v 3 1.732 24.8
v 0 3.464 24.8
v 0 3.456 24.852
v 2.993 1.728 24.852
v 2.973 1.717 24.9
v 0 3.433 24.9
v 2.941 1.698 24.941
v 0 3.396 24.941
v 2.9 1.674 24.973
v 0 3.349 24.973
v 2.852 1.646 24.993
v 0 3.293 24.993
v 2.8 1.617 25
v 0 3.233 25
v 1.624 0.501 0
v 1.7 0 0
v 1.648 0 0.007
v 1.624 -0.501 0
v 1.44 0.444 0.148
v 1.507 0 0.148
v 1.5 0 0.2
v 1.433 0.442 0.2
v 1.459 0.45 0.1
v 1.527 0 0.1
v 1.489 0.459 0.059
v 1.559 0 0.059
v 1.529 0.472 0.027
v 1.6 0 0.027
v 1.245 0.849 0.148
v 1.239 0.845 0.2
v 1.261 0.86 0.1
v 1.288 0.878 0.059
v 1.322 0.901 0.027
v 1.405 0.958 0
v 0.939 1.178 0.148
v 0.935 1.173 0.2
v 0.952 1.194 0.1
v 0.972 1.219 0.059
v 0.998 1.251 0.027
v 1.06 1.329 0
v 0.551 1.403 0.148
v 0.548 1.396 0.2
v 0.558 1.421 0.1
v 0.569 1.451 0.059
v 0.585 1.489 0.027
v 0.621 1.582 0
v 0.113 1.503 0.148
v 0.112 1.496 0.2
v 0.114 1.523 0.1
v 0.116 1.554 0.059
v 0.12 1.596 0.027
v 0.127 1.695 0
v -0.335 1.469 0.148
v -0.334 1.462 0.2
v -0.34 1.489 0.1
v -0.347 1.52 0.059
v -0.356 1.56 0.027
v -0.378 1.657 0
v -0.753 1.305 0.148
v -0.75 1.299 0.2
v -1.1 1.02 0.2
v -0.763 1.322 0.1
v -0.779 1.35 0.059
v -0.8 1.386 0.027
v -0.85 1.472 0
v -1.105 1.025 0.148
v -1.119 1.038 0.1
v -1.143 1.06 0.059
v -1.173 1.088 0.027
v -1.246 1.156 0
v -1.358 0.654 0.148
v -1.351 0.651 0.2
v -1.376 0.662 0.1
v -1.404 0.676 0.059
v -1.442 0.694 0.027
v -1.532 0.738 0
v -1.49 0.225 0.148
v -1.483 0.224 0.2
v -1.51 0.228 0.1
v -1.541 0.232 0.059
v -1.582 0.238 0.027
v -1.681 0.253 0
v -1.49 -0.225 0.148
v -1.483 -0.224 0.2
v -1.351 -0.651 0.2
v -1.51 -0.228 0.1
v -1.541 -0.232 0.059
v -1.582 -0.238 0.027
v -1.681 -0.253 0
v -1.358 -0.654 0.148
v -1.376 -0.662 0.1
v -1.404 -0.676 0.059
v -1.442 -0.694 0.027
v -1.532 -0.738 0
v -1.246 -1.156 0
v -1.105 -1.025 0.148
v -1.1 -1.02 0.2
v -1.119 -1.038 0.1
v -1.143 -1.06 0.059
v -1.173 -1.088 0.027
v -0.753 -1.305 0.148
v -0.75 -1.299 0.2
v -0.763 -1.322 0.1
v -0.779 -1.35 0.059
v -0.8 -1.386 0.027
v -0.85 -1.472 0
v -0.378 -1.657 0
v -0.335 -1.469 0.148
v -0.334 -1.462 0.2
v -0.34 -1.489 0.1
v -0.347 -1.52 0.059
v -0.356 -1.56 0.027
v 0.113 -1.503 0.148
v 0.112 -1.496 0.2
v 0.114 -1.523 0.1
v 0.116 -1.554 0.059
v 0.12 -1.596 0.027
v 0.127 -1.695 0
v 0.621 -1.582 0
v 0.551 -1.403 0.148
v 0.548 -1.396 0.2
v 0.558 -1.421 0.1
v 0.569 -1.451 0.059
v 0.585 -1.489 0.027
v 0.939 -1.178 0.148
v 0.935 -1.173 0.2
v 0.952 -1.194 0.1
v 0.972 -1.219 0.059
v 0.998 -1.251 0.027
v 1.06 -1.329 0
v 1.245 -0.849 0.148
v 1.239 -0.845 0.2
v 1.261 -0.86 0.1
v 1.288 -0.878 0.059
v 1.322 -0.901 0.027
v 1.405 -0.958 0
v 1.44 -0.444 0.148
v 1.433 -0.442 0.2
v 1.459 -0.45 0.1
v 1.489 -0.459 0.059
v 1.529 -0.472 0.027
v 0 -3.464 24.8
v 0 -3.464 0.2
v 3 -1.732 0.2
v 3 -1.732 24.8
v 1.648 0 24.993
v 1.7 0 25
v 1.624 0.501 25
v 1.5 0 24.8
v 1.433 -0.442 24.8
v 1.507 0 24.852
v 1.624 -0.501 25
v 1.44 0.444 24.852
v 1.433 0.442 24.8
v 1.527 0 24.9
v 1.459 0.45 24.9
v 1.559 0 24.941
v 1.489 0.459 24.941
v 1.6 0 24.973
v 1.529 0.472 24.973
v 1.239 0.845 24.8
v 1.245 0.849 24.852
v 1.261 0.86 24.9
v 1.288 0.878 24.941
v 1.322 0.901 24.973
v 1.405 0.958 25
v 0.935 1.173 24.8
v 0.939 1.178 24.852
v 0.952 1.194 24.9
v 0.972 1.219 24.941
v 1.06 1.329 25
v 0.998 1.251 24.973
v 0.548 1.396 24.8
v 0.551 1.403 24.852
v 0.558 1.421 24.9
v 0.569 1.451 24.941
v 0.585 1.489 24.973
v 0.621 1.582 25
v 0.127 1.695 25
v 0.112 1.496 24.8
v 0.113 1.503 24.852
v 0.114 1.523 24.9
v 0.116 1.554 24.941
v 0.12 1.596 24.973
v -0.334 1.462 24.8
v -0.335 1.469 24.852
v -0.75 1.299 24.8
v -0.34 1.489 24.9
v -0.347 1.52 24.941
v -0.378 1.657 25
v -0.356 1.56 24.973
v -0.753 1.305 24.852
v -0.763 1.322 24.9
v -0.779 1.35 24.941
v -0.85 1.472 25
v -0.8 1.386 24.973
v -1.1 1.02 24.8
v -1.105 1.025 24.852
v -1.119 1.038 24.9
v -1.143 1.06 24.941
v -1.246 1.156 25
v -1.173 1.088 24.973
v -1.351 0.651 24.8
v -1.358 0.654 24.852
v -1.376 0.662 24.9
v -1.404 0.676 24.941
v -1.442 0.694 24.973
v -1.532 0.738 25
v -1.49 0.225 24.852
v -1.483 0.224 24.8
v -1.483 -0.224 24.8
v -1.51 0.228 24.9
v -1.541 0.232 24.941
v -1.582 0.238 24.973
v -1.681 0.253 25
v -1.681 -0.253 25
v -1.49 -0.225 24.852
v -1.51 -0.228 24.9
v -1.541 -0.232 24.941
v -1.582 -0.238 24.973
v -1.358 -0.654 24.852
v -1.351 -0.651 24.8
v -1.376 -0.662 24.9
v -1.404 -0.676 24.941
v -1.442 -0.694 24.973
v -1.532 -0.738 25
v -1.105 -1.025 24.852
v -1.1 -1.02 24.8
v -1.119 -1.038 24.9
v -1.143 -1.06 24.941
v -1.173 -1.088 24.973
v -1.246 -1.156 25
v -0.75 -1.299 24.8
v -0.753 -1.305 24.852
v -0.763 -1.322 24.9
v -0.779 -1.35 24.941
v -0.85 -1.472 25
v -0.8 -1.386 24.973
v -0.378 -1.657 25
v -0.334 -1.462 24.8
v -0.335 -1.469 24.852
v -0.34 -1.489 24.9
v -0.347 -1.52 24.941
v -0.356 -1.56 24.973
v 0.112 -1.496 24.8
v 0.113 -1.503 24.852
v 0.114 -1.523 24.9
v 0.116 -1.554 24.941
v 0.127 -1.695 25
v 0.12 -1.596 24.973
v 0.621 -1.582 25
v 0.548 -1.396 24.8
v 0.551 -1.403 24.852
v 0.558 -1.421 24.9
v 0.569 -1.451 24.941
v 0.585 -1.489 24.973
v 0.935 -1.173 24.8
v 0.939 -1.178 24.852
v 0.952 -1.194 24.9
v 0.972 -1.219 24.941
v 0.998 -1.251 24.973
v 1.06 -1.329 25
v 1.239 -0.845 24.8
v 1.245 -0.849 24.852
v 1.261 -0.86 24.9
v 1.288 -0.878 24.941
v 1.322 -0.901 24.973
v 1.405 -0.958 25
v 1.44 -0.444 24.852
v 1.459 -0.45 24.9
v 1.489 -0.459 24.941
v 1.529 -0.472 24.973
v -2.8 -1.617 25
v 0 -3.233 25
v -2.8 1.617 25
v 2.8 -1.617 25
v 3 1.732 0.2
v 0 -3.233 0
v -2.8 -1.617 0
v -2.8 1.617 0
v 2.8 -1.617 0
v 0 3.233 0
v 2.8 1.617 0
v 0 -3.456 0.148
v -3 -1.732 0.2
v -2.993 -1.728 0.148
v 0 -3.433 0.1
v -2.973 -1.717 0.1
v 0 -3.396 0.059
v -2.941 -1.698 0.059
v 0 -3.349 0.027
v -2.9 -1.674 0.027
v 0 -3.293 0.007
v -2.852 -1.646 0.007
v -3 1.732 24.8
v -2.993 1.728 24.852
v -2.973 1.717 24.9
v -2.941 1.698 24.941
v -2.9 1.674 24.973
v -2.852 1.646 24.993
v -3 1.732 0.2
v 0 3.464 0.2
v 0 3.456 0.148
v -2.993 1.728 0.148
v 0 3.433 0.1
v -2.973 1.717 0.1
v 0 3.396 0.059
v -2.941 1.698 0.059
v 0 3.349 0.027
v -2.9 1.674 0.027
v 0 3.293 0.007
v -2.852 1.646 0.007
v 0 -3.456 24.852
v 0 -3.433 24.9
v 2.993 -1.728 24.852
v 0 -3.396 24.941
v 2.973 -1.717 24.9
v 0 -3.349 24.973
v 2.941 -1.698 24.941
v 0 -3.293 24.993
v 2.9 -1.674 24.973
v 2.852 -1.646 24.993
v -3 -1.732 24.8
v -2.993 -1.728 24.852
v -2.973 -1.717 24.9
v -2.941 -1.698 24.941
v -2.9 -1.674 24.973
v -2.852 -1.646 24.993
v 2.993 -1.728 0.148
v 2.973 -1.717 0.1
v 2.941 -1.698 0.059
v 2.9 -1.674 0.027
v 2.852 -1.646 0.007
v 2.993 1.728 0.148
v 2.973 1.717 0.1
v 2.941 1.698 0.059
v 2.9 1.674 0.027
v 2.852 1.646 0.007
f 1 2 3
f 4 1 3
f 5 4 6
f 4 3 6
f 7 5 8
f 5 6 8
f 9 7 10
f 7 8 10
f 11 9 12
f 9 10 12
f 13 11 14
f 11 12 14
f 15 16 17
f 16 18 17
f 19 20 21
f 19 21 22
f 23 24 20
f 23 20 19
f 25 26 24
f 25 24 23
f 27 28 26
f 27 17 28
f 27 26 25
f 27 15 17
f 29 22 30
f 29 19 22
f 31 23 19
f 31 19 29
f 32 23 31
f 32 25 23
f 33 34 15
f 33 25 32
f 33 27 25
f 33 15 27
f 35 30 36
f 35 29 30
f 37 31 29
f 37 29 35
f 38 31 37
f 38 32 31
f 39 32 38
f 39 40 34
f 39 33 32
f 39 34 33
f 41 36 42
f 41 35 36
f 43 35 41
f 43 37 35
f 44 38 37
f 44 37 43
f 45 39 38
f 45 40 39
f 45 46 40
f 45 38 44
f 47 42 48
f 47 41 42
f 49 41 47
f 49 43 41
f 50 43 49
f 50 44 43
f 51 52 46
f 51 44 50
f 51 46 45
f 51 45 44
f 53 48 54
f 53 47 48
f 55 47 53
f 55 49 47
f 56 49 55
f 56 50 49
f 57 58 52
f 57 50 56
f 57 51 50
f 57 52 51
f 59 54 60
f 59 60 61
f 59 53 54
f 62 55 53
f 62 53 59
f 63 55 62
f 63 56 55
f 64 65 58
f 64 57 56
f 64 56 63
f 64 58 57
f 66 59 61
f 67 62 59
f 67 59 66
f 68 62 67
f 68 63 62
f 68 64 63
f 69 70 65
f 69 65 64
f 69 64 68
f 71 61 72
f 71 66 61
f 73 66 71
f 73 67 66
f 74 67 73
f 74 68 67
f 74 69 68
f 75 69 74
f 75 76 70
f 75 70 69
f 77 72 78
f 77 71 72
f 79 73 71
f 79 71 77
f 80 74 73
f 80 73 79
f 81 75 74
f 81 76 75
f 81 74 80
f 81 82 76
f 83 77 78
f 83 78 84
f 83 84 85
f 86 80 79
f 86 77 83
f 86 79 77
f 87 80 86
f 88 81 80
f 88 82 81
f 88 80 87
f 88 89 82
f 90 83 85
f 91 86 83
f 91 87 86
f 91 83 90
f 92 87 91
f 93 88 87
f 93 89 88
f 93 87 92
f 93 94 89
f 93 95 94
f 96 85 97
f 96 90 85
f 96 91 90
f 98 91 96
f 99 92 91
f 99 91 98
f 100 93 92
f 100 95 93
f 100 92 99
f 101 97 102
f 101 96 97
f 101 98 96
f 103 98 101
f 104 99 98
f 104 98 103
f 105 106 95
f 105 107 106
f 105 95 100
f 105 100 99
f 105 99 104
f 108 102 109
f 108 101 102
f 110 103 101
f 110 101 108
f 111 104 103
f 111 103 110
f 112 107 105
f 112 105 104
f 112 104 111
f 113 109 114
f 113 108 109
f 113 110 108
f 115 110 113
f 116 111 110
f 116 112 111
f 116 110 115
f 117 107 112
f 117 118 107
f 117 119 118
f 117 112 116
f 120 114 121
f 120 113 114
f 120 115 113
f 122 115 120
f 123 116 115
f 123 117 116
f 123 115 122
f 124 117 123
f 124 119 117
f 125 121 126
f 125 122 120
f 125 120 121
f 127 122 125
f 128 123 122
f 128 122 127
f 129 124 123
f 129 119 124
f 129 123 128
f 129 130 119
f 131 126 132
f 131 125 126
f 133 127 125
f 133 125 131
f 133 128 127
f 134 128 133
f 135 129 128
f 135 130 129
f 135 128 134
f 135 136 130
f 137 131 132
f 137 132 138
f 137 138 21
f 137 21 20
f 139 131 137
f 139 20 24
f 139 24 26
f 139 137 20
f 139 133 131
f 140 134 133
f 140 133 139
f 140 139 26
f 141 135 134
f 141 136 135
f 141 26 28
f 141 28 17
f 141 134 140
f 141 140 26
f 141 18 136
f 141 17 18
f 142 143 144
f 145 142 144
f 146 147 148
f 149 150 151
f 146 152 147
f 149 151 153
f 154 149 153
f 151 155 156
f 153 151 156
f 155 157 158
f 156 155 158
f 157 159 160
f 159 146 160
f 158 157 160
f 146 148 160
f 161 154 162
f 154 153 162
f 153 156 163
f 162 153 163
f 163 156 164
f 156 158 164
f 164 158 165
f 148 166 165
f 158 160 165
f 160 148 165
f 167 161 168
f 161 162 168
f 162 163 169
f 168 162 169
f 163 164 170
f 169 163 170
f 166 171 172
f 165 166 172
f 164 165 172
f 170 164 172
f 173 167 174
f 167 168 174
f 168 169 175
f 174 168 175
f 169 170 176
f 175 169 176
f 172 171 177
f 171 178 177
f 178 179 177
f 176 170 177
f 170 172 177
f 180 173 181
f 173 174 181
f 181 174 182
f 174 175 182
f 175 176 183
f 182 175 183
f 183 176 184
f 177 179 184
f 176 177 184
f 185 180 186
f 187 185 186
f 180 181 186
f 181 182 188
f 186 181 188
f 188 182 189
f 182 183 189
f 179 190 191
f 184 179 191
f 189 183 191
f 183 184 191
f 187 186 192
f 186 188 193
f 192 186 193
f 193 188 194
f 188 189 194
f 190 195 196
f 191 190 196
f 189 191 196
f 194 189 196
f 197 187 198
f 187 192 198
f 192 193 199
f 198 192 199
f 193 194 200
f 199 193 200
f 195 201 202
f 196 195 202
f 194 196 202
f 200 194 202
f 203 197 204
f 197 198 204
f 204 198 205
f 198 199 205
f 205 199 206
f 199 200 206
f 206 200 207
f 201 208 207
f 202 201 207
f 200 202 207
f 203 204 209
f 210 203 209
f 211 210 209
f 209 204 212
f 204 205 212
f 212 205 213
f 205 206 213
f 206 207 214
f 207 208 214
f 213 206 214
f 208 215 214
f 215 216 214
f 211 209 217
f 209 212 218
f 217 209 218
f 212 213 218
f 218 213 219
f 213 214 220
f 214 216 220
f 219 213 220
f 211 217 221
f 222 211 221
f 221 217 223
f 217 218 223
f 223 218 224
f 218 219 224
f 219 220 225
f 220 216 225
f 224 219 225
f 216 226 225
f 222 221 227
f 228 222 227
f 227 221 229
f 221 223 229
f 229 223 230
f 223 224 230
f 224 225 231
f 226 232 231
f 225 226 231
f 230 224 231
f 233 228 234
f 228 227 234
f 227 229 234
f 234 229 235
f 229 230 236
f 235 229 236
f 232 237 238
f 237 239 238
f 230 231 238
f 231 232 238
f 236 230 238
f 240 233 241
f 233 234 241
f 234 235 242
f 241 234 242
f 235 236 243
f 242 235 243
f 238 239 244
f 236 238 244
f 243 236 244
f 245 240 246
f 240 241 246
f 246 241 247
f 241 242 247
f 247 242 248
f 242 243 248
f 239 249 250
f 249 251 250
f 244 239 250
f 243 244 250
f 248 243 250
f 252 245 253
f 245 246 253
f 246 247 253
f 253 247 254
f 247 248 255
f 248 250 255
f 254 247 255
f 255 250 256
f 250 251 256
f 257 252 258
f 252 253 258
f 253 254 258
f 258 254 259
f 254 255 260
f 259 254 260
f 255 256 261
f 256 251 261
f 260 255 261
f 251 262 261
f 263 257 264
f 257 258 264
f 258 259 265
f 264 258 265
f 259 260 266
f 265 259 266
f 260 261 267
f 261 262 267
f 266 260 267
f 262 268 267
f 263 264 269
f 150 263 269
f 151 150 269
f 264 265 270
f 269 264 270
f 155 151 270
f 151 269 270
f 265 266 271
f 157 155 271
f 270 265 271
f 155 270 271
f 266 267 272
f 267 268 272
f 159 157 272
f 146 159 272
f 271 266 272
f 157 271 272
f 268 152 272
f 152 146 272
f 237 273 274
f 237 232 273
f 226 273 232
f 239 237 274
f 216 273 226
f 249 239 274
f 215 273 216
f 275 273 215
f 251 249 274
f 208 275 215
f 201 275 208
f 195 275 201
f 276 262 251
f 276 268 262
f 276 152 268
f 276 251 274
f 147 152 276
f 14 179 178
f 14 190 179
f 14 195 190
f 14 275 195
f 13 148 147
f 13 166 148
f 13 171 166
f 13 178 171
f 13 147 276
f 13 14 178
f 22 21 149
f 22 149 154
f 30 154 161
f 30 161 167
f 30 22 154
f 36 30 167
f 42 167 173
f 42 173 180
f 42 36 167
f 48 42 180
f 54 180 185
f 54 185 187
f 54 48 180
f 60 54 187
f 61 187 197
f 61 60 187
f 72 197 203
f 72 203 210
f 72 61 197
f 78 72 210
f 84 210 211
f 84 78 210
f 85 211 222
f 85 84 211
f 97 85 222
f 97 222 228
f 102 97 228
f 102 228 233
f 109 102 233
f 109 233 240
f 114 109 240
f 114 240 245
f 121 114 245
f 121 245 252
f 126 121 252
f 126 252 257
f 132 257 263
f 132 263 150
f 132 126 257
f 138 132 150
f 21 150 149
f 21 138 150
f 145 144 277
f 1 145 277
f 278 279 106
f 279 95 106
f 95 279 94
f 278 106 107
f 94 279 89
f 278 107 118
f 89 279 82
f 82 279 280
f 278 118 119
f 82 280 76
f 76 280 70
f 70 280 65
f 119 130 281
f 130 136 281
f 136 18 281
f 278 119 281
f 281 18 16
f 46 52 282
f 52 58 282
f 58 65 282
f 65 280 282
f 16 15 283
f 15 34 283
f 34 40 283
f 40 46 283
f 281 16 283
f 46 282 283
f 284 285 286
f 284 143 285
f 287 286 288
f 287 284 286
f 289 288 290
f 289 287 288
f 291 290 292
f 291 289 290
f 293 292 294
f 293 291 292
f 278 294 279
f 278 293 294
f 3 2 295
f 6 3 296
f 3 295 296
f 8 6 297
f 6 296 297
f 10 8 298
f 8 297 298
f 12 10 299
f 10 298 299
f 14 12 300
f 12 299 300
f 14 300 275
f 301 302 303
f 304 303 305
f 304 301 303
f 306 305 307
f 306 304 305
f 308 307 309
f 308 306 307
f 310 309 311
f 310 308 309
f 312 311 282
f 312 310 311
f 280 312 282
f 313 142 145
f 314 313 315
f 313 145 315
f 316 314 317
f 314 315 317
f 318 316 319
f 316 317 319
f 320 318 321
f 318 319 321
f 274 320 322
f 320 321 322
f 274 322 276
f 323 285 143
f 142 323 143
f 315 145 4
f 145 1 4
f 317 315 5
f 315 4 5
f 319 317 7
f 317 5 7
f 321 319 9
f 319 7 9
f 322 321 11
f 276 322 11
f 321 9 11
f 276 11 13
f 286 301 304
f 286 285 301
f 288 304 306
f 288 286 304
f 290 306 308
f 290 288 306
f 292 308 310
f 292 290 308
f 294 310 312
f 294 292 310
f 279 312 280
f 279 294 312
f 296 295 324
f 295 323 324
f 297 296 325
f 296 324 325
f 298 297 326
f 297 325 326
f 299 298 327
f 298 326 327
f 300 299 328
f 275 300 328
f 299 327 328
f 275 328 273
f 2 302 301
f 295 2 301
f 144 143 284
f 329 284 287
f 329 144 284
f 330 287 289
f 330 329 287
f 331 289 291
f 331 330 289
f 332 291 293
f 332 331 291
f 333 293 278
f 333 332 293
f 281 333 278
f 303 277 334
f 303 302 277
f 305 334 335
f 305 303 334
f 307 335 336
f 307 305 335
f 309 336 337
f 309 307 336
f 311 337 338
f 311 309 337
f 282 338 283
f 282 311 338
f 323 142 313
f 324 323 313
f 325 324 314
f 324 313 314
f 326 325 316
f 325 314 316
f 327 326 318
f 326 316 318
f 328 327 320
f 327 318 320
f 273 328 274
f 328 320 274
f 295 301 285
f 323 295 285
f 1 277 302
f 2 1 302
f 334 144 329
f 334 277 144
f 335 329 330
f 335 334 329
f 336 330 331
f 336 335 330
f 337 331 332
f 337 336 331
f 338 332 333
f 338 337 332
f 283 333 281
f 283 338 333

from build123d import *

# Parameters (mm, degrees)
F0_R     = 1.5
F1_DEPTH = 25
F2_R     = 0.2


with BuildPart() as f1:
    # F0 (on Top) → F1 (new body)
    with BuildSketch(Plane.XY):
        Polygon((3, 1.732051), (0, 3.464102), (-3, 1.732051), (-3, -1.732051), (0, -3.464102), (3, -1.732051), align=None)
        Circle(F0_R, mode=Mode.SUBTRACT)
    extrude(amount=F1_DEPTH)

    # F2
    f2_edges = [f1.edges().sort_by_distance(p)[0] for p in [
        (1.5, 2.598076, 25),
        (-1.5, 2.598076, 25),
        (-3, 0, 25),
        (-1.5, -2.598076, 25),
        (1.5, -2.598076, 25),
        (3, 0, 25),
        (-1.5, 0, 25),
        (1.5, 2.598076, 0),
        (-1.5, 2.598076, 0),
        (-3, 0, 0),
        (-1.5, -2.598076, 0),
        (1.5, -2.598076, 0),
        (3, 0, 0),
        (-1.5, 0, 0),
    ]]
    fillet(f2_edges, radius=F2_R)


solid = f1.part
